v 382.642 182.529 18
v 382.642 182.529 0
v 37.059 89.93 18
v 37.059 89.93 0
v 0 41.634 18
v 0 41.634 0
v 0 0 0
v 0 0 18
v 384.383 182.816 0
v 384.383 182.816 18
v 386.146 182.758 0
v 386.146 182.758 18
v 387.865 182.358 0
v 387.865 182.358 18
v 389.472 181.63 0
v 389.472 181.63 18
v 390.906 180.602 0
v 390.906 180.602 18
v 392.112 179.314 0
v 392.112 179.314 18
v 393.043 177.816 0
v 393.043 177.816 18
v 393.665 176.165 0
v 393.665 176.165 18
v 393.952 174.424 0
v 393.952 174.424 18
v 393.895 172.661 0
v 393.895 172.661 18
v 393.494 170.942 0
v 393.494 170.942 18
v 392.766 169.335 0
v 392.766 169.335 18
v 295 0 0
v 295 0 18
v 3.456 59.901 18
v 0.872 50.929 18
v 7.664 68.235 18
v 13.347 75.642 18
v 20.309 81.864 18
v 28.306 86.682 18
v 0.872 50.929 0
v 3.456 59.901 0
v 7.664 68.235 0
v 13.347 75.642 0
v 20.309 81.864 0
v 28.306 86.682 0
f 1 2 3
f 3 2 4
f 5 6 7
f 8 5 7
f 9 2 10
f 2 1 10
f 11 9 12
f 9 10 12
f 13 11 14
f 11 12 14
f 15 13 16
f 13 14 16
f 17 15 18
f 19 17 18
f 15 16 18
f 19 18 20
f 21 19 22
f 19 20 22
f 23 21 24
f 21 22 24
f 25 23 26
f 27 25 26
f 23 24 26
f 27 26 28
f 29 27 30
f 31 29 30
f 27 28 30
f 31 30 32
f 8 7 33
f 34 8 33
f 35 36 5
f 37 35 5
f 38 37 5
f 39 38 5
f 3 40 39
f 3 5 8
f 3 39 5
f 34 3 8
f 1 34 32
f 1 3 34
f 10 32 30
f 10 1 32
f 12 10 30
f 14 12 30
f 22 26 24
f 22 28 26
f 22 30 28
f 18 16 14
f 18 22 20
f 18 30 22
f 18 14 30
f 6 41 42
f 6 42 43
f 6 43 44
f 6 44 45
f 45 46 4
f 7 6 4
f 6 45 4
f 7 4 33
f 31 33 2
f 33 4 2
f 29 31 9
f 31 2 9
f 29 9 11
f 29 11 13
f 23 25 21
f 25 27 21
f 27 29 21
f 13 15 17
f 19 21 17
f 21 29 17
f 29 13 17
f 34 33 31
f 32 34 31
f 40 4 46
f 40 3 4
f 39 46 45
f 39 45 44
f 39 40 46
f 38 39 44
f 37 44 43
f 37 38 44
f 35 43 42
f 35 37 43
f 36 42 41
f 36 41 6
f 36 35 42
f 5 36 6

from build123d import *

# Parameters (mm, degrees)
BOSS_EXTRU_1_DEPTH = 18
CONG_1_R           = 50
CONG_2_R           = 9


with BuildPart() as part:
    # Esquisse1 → Boss.-Extru.1 (new body)
    with BuildSketch(Plane.XY):
        Polygon((0, 0), (295, 0), (403.62976321, 188.152269093), (0, 80), align=None)
    extrude(amount=BOSS_EXTRU_1_DEPTH)

    # Congé1
    cong_1_edges = [part.edges().sort_by_distance(p)[0] for p in [
        (0, 80, 9),
    ]]
    fillet(cong_1_edges, radius=CONG_1_R)

    # Congé2
    cong_2_edges = [part.edges().sort_by_distance(p)[0] for p in [
        (403.62976321, 188.152269093, 9),
    ]]
    fillet(cong_2_edges, radius=CONG_2_R)


solid = part.part
